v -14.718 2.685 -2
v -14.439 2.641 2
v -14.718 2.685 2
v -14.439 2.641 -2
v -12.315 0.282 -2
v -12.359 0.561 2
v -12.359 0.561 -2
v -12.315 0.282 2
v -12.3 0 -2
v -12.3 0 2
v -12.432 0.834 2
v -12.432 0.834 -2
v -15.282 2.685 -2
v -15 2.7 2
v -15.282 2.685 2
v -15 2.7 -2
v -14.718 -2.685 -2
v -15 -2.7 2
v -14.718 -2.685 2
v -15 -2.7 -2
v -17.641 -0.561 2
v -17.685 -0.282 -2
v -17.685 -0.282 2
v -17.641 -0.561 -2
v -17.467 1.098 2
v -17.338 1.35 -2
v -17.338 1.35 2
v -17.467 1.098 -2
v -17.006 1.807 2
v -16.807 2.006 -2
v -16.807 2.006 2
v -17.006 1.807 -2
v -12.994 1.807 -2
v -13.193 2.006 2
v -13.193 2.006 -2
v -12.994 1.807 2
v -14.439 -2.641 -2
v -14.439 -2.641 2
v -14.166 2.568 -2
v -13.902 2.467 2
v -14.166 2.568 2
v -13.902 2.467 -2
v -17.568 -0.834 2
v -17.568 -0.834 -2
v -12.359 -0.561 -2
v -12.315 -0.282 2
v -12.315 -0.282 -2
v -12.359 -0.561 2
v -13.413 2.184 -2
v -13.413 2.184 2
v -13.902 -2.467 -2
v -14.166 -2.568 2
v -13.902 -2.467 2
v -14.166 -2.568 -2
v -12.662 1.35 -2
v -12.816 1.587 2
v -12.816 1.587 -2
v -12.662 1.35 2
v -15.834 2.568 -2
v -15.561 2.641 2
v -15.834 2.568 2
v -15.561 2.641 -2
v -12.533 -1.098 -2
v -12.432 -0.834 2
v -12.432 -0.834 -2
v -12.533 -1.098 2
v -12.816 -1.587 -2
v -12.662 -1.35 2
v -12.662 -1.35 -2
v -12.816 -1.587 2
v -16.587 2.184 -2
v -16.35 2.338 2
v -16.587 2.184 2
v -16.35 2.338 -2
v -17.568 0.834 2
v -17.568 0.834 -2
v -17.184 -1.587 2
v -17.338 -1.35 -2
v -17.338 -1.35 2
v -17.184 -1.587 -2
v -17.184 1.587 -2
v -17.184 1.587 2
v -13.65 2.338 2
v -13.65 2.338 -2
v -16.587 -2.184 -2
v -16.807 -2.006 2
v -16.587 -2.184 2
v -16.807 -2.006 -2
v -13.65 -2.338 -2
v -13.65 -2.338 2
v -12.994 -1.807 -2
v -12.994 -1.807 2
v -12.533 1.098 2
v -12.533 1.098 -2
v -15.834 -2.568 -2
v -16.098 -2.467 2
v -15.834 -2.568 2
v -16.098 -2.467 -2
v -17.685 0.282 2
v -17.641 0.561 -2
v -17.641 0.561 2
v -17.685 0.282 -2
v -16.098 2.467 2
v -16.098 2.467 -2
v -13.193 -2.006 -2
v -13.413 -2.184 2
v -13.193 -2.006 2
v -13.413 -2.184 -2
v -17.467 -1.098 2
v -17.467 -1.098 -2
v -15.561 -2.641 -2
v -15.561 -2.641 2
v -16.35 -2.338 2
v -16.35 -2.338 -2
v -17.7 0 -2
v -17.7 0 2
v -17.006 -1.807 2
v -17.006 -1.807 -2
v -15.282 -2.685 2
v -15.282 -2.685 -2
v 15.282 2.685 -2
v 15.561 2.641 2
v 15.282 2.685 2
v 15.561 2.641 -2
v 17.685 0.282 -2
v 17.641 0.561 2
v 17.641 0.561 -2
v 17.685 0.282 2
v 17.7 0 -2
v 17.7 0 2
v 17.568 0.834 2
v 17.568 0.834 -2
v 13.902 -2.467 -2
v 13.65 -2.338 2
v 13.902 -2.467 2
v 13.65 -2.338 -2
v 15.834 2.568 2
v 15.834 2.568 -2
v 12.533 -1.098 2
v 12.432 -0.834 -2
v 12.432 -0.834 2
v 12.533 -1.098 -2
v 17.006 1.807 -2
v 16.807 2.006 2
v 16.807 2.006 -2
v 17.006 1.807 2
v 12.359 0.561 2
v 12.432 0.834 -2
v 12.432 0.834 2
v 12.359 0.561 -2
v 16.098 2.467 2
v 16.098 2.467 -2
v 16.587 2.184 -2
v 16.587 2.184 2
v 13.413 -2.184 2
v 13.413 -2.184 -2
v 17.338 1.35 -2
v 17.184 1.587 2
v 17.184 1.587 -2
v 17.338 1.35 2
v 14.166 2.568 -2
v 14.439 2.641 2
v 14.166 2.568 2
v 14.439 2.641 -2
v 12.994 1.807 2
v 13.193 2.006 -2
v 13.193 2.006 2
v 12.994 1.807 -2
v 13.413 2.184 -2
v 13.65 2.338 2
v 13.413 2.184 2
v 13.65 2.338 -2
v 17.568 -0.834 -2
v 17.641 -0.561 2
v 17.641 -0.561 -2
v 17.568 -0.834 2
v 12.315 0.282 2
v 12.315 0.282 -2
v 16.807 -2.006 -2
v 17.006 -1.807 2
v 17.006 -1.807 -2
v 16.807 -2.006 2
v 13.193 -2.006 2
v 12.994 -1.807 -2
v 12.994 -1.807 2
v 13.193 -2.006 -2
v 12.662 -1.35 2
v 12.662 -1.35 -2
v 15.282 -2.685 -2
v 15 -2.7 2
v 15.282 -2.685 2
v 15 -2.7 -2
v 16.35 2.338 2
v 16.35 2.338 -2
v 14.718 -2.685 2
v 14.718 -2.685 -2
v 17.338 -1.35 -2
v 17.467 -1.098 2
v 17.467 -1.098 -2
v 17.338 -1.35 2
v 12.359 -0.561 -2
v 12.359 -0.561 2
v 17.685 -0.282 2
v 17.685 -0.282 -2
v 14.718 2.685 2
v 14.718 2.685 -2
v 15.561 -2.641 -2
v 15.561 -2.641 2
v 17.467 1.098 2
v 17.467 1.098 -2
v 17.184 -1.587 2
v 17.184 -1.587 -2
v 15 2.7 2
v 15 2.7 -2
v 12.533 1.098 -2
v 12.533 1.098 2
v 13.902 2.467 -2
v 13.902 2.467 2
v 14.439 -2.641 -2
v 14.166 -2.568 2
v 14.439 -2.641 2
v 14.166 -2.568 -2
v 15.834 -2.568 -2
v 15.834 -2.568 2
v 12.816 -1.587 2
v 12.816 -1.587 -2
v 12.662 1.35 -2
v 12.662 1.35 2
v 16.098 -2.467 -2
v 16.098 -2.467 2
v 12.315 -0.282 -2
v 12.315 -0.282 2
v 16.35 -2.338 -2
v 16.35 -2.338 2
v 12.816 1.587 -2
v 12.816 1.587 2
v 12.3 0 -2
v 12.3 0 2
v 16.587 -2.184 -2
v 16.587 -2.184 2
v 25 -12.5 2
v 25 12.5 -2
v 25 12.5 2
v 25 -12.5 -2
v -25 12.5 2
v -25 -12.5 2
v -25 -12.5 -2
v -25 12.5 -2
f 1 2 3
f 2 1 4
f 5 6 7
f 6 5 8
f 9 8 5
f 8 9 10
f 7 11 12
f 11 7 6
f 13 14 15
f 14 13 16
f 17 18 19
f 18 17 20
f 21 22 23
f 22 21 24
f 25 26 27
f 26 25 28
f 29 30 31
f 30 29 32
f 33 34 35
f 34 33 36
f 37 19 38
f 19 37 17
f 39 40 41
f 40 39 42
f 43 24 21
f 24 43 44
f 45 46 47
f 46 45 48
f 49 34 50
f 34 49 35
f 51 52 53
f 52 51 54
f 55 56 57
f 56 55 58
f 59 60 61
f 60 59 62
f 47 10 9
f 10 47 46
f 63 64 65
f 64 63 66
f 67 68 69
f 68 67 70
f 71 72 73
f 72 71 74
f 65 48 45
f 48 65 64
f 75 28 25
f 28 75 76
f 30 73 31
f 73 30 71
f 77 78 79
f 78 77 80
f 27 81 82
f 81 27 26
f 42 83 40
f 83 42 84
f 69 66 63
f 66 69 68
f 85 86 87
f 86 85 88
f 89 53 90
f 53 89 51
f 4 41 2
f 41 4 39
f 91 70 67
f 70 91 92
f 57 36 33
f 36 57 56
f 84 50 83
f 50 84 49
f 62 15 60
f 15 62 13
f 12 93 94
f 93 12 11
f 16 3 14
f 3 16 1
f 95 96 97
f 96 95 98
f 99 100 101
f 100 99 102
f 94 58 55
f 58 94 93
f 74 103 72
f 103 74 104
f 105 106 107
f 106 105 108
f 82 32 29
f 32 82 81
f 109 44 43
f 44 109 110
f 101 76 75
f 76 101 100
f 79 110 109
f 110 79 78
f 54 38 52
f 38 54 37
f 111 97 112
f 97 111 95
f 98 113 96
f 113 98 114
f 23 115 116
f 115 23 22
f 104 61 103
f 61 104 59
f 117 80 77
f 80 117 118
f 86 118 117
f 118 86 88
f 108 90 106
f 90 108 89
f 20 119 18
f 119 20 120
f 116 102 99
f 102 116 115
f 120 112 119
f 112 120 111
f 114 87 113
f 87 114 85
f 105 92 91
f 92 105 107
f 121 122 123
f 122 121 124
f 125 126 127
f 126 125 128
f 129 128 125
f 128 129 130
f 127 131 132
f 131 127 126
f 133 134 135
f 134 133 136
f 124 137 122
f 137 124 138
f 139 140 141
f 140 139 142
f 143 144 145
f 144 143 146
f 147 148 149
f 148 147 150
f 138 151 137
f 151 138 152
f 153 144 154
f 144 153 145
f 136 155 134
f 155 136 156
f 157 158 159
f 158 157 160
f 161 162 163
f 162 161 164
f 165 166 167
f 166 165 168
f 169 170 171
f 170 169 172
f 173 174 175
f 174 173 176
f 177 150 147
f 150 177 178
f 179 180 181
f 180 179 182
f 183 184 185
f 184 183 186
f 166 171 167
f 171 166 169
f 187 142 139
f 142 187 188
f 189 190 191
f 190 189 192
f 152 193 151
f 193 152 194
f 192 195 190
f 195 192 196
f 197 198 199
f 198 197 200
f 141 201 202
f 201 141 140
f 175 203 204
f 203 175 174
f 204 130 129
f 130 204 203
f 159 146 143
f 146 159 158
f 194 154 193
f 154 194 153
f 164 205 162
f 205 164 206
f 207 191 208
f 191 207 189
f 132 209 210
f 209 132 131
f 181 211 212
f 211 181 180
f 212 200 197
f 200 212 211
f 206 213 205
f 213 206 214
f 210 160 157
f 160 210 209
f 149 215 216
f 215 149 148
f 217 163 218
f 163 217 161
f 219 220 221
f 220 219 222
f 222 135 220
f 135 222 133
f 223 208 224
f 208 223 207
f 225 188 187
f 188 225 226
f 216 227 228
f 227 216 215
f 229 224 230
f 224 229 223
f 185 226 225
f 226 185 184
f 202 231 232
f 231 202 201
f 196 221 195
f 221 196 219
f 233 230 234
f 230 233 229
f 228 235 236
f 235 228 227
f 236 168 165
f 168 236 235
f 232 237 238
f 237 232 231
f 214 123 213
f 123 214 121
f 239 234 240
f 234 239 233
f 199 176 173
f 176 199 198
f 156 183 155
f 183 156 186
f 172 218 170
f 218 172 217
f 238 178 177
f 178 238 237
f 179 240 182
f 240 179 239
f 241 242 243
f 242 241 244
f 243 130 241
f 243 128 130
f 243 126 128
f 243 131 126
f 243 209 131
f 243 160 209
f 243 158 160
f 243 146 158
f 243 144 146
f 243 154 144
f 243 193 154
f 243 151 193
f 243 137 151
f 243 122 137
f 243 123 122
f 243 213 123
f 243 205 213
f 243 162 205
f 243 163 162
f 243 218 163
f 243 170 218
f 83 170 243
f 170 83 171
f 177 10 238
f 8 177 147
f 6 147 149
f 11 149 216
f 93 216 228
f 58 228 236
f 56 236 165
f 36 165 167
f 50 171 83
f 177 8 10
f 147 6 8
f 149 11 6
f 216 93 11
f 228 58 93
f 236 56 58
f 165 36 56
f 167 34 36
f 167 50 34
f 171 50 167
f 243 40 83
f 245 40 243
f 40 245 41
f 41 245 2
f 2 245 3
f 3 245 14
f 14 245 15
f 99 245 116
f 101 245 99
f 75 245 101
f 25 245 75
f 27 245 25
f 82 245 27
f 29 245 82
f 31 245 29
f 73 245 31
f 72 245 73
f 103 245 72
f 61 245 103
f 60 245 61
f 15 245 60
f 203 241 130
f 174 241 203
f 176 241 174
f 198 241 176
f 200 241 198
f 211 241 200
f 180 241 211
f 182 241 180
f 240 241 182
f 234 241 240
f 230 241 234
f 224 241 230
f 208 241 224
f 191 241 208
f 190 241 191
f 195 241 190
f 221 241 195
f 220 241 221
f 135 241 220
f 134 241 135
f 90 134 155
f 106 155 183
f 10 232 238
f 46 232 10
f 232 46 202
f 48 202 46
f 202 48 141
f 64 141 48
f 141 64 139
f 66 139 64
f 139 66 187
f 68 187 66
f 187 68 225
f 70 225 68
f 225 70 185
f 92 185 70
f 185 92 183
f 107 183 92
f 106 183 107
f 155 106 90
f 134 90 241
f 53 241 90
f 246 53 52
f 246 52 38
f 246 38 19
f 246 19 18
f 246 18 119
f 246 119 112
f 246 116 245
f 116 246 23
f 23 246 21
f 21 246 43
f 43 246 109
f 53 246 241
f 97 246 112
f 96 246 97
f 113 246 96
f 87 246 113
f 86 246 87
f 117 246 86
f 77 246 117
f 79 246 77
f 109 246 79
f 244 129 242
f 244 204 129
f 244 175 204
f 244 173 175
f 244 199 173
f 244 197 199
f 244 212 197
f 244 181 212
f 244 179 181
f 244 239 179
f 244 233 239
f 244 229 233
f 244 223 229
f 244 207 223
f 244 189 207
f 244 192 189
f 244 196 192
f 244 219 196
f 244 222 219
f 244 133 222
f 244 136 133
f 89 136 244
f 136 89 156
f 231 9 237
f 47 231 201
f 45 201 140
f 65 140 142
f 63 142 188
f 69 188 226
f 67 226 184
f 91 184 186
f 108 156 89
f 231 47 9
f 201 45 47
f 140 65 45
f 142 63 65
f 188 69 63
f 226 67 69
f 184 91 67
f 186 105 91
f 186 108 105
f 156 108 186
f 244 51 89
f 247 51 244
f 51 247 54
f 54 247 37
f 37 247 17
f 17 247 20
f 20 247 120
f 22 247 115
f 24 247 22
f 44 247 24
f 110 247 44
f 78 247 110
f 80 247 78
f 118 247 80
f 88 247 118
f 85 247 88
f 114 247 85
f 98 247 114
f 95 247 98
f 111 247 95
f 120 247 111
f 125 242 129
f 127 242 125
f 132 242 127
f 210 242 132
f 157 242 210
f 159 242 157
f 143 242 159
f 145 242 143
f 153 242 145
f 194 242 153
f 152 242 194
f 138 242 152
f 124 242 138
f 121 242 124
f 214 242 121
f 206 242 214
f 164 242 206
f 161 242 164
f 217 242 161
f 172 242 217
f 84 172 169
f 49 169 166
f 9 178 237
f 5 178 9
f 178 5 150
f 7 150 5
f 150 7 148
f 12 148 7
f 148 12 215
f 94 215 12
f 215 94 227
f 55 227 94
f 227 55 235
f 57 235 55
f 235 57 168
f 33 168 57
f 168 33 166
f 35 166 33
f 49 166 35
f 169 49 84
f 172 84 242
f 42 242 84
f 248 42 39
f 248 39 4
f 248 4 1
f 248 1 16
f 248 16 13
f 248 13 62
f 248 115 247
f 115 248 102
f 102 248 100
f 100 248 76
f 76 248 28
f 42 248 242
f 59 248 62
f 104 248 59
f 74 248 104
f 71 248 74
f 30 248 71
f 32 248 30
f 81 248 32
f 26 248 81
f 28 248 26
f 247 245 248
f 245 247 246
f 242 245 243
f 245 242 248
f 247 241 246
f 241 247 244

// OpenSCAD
// Multi-hole mounting plate.
$fn = 60;
eps = 0.02;
plate_l = 50;
plate_w = 25;
plate_t = 4;
hole_d = 5.4;
edge = 10;
difference() {
    cube([plate_l, plate_w, plate_t], center = true);
    for (i = [0 : 1])
        translate([-plate_l / 2 + edge + i * (plate_l - 2 * edge) / max(1, 1), 0, -plate_t / 2 - eps])
            cylinder(d = hole_d, h = plate_t + 2 * eps);
}
